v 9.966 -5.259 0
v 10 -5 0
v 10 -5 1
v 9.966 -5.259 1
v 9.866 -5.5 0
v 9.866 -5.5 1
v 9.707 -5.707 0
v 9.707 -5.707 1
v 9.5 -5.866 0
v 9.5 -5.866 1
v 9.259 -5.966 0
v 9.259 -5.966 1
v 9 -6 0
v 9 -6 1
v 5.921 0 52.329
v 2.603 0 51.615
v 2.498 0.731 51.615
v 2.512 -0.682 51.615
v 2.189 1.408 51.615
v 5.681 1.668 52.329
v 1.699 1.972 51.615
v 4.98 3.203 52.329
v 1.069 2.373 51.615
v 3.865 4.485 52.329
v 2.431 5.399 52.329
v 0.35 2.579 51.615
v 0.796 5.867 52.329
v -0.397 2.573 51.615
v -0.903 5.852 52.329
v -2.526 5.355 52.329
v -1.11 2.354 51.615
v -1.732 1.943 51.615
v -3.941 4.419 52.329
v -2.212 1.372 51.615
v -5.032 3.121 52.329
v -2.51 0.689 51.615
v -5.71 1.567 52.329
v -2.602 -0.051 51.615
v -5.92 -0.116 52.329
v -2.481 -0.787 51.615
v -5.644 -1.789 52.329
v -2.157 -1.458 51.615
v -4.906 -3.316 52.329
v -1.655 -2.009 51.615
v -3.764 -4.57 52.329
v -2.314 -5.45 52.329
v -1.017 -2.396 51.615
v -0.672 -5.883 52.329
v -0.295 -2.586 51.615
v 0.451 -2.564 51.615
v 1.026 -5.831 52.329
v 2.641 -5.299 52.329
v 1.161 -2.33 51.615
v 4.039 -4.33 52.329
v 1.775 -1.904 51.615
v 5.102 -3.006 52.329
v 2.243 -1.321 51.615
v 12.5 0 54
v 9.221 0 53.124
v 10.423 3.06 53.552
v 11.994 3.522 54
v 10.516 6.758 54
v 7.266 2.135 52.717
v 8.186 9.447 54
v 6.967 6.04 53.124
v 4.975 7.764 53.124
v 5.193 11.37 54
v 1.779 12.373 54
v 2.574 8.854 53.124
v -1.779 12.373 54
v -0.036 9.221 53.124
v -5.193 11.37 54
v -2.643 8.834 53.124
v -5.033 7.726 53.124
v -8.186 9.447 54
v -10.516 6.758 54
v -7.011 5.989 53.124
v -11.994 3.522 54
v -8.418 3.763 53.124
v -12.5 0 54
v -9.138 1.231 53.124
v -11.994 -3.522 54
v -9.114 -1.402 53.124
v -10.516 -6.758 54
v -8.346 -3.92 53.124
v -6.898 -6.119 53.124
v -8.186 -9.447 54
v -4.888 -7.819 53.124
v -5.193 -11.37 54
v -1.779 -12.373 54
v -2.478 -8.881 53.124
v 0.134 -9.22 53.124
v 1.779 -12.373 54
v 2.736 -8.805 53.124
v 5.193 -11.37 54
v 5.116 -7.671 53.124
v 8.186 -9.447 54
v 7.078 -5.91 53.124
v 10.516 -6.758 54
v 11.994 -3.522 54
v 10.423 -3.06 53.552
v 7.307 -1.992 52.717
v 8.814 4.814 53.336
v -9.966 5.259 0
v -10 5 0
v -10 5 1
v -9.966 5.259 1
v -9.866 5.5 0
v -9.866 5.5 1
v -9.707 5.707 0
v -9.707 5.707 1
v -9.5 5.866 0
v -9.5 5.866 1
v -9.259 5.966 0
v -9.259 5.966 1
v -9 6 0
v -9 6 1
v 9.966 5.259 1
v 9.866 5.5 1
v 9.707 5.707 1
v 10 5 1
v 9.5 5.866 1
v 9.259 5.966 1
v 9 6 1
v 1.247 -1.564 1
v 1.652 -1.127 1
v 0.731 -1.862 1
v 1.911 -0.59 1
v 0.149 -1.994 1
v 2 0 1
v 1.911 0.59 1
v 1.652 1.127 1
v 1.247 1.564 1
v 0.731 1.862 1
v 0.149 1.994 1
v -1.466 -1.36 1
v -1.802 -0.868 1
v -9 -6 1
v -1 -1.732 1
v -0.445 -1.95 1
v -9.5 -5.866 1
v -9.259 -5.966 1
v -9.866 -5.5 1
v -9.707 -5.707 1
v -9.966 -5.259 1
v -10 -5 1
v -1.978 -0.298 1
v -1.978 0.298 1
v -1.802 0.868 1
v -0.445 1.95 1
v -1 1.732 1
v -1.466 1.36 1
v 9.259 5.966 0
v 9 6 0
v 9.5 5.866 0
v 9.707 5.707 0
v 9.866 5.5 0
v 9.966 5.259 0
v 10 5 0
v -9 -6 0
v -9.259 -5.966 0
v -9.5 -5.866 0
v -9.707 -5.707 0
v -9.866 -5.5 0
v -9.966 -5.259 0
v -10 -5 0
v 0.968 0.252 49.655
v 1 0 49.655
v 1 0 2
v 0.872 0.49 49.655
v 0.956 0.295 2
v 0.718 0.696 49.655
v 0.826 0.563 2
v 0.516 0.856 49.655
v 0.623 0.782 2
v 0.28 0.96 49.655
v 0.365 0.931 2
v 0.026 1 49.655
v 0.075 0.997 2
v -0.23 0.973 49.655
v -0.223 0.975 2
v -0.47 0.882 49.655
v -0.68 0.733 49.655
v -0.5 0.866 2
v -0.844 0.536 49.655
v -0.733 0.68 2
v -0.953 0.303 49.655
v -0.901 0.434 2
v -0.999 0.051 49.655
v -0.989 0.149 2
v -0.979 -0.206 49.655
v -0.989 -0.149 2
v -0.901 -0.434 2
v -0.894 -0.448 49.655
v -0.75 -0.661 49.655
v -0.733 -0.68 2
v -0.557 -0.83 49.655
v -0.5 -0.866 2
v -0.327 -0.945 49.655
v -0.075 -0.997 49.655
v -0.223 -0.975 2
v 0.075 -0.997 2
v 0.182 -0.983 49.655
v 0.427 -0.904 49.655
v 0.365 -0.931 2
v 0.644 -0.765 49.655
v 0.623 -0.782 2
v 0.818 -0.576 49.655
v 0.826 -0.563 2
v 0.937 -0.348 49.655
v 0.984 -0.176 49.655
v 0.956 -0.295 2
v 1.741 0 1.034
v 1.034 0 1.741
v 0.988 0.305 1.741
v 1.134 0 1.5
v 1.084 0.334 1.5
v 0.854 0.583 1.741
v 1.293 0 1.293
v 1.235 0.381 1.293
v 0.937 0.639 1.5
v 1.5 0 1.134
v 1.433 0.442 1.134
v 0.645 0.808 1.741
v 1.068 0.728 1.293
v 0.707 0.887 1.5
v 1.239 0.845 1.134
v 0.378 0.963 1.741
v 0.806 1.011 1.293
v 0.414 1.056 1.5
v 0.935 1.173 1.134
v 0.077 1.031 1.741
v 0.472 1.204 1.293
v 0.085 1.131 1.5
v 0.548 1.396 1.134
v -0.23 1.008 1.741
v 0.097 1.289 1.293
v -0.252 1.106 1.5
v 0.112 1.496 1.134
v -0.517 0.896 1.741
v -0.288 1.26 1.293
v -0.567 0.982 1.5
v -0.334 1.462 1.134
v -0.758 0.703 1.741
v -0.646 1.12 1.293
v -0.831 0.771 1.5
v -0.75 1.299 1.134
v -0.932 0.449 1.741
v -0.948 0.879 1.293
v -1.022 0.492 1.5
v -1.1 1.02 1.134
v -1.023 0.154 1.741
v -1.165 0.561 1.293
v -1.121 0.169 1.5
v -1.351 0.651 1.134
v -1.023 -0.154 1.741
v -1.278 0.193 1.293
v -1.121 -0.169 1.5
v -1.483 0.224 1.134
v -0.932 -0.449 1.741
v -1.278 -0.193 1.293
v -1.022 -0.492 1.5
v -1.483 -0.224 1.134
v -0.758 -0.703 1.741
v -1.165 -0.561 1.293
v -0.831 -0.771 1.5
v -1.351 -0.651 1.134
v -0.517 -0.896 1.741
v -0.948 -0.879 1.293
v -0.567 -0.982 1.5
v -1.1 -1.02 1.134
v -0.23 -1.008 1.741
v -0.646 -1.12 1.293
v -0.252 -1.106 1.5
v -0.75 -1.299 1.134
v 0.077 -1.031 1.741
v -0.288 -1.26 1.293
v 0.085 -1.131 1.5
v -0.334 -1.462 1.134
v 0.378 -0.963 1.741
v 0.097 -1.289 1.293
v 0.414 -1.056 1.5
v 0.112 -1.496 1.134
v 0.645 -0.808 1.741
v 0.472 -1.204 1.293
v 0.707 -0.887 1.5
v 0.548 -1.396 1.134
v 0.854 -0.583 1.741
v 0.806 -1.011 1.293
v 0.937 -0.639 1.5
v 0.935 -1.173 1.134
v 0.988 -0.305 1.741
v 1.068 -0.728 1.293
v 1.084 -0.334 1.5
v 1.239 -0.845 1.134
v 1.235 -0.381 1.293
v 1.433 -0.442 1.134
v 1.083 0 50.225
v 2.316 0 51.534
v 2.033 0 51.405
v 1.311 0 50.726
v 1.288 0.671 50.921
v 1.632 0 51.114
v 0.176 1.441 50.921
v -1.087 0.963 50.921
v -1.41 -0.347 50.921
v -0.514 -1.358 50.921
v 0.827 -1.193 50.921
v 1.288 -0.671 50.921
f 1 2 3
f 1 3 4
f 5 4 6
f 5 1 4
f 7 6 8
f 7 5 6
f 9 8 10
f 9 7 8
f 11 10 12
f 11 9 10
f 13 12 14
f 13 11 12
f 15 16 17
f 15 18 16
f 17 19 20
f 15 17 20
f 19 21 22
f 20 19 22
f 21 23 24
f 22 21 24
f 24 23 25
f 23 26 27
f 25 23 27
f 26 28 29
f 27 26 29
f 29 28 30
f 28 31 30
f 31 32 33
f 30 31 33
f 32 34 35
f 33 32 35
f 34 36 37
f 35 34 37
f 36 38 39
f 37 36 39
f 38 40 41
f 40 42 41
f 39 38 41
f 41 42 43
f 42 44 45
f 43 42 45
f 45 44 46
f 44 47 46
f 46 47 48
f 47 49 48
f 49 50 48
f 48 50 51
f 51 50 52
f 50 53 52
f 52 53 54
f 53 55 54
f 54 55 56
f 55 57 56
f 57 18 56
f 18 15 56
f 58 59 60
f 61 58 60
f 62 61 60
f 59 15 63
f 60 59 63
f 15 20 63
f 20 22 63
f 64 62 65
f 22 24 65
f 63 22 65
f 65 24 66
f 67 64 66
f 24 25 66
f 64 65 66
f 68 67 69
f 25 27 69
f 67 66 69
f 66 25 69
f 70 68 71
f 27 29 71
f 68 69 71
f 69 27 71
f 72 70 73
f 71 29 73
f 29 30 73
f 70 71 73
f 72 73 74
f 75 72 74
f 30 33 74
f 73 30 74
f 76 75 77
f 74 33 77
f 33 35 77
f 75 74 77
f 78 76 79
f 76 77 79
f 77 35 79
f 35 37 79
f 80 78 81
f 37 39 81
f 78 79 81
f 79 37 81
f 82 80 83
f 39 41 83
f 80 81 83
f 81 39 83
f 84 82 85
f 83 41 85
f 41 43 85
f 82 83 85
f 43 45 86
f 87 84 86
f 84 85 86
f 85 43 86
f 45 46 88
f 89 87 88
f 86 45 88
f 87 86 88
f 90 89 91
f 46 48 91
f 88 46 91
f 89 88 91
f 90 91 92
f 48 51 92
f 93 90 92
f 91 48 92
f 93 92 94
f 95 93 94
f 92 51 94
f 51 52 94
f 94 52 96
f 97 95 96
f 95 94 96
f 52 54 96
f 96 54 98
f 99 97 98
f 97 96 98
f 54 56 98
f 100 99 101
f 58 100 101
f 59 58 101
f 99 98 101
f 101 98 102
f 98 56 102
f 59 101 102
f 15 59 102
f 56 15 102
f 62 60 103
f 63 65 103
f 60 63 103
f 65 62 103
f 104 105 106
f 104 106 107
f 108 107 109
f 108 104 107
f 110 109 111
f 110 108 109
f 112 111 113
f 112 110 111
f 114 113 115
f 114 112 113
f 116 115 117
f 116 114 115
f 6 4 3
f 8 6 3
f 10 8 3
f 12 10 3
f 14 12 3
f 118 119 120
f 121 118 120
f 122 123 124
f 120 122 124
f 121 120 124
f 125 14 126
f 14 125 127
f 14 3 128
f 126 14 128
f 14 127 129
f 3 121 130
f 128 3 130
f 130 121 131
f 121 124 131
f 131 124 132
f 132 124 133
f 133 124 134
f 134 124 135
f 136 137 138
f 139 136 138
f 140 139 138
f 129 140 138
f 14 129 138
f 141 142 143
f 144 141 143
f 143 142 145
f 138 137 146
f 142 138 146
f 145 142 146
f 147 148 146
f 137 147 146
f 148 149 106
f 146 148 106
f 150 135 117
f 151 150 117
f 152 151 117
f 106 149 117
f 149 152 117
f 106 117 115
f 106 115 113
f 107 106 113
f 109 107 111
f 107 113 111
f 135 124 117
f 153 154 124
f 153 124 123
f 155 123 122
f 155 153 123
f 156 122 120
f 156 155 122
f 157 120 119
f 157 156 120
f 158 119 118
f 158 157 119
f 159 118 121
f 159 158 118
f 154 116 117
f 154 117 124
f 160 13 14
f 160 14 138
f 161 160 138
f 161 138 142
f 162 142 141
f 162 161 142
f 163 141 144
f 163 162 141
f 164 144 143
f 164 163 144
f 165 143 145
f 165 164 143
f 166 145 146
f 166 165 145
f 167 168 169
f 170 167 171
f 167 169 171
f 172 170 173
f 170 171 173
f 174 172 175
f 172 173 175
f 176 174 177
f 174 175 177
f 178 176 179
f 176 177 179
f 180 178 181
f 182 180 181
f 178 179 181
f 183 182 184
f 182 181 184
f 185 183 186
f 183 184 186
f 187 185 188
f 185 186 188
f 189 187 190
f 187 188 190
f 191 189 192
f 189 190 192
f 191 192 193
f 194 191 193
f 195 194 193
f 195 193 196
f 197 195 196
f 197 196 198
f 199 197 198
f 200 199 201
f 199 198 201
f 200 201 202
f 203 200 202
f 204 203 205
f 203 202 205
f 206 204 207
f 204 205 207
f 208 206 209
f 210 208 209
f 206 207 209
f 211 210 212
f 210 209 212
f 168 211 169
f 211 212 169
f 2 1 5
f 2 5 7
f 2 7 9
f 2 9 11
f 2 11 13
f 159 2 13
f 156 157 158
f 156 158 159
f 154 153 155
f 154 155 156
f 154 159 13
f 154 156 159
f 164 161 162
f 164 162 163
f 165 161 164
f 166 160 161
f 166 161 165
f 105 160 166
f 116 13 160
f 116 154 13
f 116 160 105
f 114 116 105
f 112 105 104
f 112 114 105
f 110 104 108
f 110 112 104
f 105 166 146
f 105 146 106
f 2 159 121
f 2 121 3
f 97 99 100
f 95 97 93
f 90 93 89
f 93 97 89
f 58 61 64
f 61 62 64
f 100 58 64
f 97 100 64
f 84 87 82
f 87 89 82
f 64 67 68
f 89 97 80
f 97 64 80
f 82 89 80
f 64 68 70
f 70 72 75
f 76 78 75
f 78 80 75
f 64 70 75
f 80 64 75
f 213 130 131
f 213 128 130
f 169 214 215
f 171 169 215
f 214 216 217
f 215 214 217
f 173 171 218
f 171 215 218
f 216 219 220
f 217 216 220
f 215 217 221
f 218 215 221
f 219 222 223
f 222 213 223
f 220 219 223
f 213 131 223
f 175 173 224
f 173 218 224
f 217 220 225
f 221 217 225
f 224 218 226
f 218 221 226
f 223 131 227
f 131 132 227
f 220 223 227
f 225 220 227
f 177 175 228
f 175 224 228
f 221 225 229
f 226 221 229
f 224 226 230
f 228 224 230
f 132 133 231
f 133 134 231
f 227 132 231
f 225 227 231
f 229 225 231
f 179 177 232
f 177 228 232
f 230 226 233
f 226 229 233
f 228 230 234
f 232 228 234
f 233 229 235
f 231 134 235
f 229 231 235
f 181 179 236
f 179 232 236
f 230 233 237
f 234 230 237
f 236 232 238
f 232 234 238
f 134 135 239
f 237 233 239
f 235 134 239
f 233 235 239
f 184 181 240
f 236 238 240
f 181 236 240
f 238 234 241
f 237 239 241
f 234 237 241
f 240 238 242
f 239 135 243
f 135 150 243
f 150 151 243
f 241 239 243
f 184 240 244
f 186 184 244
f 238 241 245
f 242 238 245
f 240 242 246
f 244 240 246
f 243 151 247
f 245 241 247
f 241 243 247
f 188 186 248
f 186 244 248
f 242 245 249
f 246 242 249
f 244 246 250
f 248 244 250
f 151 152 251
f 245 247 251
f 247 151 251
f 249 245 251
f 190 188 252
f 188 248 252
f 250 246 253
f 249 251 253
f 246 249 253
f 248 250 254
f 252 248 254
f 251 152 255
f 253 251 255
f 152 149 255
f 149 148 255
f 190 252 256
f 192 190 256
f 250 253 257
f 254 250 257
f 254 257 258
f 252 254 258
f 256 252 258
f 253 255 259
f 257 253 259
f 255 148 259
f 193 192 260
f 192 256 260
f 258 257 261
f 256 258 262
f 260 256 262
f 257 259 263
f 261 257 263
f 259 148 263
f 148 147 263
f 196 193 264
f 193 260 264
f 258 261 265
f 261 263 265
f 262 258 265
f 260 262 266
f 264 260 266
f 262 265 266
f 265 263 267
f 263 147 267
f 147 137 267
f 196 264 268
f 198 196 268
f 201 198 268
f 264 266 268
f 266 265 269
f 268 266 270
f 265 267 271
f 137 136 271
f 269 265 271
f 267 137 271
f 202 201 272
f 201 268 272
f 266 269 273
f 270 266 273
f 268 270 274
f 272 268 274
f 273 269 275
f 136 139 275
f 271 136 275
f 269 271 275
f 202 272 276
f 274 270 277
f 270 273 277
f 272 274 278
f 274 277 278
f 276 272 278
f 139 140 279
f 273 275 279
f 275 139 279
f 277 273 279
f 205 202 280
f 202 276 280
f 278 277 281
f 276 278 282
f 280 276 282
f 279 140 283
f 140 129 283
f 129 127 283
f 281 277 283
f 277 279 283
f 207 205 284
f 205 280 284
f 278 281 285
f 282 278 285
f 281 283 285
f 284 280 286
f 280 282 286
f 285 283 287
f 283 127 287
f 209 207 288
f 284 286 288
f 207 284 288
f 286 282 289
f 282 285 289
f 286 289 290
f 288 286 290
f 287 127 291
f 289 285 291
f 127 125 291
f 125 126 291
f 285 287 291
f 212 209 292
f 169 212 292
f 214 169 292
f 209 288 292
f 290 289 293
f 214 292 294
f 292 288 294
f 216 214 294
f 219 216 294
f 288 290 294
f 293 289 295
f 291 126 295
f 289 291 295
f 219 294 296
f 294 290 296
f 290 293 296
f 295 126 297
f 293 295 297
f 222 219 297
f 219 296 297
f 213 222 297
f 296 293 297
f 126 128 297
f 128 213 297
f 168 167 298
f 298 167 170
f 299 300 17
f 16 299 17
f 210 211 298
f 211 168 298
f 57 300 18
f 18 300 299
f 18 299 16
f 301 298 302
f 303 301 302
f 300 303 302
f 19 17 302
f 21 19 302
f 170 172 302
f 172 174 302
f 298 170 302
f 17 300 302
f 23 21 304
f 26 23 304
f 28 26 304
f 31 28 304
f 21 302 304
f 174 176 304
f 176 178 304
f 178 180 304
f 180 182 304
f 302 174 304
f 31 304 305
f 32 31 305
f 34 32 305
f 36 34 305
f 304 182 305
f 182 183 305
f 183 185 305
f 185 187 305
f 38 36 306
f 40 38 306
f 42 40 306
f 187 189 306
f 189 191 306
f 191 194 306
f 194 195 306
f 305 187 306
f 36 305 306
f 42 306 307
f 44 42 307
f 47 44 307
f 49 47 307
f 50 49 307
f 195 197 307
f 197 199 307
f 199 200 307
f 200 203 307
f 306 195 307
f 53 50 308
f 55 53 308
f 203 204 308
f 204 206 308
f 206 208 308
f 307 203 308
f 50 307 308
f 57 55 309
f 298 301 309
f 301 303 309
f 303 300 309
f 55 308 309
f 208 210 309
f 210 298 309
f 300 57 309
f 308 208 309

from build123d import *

# Parameters (mm, degrees)
BOSS_EXTRUDE1_DEPTH = 1
FILLET1_R           = 2
FILLET2_R           = 1


with BuildPart() as part:
    # Sketch1 → Boss-Extrude1 (new body)
    with BuildSketch(Plane.XY):
        with BuildLine():
            Line((-9, 6), (9, 6))
            ThreePointArc((9, 6), (9.707106781, 5.707106781), (10, 5))
            Line((10, 5), (10, -5))
            ThreePointArc((10, -5), (9.707106781, -5.707106781), (9, -6))
            Line((9, -6), (-9, -6))
            ThreePointArc((-9, -6), (-9.707106781, -5.707106781), (-10, -5))
            Line((-10, -5), (-10, 5))
            ThreePointArc((-10, 5), (-9.707106781, 5.707106781), (-9, 6))
        make_face()
    extrude(amount=BOSS_EXTRUDE1_DEPTH)

    # Sketch2 → Revolve2 (revolve)
    with BuildSketch(Plane(origin=(0, 0, 0), x_dir=(1, 0, 0), z_dir=(0, 1, 0))):
        with BuildLine():
            Line((0, -1), (0, -54))
            Line((0, -54), (12.5, -54))
            ThreePointArc((12.5, -54), (6.778694886, -52.527781041), (1, -51.3))
            Line((1, -51.3), (1, -1))
            Line((1, -1), (0, -1))
        make_face()
    revolve(axis=Axis((0, 0, 1), (0, 0, 1)))

    # Fillet1
    fillet1_edges = [part.edges().sort_by_distance(p)[0] for p in [
        (-1, 0, 51.3),
    ]]
    fillet(fillet1_edges, radius=FILLET1_R)

    # Fillet2
    fillet2_edges = [part.edges().sort_by_distance(p)[0] for p in [
        (-1, 0, 1),
    ]]
    fillet(fillet2_edges, radius=FILLET2_R)


solid = part.part
